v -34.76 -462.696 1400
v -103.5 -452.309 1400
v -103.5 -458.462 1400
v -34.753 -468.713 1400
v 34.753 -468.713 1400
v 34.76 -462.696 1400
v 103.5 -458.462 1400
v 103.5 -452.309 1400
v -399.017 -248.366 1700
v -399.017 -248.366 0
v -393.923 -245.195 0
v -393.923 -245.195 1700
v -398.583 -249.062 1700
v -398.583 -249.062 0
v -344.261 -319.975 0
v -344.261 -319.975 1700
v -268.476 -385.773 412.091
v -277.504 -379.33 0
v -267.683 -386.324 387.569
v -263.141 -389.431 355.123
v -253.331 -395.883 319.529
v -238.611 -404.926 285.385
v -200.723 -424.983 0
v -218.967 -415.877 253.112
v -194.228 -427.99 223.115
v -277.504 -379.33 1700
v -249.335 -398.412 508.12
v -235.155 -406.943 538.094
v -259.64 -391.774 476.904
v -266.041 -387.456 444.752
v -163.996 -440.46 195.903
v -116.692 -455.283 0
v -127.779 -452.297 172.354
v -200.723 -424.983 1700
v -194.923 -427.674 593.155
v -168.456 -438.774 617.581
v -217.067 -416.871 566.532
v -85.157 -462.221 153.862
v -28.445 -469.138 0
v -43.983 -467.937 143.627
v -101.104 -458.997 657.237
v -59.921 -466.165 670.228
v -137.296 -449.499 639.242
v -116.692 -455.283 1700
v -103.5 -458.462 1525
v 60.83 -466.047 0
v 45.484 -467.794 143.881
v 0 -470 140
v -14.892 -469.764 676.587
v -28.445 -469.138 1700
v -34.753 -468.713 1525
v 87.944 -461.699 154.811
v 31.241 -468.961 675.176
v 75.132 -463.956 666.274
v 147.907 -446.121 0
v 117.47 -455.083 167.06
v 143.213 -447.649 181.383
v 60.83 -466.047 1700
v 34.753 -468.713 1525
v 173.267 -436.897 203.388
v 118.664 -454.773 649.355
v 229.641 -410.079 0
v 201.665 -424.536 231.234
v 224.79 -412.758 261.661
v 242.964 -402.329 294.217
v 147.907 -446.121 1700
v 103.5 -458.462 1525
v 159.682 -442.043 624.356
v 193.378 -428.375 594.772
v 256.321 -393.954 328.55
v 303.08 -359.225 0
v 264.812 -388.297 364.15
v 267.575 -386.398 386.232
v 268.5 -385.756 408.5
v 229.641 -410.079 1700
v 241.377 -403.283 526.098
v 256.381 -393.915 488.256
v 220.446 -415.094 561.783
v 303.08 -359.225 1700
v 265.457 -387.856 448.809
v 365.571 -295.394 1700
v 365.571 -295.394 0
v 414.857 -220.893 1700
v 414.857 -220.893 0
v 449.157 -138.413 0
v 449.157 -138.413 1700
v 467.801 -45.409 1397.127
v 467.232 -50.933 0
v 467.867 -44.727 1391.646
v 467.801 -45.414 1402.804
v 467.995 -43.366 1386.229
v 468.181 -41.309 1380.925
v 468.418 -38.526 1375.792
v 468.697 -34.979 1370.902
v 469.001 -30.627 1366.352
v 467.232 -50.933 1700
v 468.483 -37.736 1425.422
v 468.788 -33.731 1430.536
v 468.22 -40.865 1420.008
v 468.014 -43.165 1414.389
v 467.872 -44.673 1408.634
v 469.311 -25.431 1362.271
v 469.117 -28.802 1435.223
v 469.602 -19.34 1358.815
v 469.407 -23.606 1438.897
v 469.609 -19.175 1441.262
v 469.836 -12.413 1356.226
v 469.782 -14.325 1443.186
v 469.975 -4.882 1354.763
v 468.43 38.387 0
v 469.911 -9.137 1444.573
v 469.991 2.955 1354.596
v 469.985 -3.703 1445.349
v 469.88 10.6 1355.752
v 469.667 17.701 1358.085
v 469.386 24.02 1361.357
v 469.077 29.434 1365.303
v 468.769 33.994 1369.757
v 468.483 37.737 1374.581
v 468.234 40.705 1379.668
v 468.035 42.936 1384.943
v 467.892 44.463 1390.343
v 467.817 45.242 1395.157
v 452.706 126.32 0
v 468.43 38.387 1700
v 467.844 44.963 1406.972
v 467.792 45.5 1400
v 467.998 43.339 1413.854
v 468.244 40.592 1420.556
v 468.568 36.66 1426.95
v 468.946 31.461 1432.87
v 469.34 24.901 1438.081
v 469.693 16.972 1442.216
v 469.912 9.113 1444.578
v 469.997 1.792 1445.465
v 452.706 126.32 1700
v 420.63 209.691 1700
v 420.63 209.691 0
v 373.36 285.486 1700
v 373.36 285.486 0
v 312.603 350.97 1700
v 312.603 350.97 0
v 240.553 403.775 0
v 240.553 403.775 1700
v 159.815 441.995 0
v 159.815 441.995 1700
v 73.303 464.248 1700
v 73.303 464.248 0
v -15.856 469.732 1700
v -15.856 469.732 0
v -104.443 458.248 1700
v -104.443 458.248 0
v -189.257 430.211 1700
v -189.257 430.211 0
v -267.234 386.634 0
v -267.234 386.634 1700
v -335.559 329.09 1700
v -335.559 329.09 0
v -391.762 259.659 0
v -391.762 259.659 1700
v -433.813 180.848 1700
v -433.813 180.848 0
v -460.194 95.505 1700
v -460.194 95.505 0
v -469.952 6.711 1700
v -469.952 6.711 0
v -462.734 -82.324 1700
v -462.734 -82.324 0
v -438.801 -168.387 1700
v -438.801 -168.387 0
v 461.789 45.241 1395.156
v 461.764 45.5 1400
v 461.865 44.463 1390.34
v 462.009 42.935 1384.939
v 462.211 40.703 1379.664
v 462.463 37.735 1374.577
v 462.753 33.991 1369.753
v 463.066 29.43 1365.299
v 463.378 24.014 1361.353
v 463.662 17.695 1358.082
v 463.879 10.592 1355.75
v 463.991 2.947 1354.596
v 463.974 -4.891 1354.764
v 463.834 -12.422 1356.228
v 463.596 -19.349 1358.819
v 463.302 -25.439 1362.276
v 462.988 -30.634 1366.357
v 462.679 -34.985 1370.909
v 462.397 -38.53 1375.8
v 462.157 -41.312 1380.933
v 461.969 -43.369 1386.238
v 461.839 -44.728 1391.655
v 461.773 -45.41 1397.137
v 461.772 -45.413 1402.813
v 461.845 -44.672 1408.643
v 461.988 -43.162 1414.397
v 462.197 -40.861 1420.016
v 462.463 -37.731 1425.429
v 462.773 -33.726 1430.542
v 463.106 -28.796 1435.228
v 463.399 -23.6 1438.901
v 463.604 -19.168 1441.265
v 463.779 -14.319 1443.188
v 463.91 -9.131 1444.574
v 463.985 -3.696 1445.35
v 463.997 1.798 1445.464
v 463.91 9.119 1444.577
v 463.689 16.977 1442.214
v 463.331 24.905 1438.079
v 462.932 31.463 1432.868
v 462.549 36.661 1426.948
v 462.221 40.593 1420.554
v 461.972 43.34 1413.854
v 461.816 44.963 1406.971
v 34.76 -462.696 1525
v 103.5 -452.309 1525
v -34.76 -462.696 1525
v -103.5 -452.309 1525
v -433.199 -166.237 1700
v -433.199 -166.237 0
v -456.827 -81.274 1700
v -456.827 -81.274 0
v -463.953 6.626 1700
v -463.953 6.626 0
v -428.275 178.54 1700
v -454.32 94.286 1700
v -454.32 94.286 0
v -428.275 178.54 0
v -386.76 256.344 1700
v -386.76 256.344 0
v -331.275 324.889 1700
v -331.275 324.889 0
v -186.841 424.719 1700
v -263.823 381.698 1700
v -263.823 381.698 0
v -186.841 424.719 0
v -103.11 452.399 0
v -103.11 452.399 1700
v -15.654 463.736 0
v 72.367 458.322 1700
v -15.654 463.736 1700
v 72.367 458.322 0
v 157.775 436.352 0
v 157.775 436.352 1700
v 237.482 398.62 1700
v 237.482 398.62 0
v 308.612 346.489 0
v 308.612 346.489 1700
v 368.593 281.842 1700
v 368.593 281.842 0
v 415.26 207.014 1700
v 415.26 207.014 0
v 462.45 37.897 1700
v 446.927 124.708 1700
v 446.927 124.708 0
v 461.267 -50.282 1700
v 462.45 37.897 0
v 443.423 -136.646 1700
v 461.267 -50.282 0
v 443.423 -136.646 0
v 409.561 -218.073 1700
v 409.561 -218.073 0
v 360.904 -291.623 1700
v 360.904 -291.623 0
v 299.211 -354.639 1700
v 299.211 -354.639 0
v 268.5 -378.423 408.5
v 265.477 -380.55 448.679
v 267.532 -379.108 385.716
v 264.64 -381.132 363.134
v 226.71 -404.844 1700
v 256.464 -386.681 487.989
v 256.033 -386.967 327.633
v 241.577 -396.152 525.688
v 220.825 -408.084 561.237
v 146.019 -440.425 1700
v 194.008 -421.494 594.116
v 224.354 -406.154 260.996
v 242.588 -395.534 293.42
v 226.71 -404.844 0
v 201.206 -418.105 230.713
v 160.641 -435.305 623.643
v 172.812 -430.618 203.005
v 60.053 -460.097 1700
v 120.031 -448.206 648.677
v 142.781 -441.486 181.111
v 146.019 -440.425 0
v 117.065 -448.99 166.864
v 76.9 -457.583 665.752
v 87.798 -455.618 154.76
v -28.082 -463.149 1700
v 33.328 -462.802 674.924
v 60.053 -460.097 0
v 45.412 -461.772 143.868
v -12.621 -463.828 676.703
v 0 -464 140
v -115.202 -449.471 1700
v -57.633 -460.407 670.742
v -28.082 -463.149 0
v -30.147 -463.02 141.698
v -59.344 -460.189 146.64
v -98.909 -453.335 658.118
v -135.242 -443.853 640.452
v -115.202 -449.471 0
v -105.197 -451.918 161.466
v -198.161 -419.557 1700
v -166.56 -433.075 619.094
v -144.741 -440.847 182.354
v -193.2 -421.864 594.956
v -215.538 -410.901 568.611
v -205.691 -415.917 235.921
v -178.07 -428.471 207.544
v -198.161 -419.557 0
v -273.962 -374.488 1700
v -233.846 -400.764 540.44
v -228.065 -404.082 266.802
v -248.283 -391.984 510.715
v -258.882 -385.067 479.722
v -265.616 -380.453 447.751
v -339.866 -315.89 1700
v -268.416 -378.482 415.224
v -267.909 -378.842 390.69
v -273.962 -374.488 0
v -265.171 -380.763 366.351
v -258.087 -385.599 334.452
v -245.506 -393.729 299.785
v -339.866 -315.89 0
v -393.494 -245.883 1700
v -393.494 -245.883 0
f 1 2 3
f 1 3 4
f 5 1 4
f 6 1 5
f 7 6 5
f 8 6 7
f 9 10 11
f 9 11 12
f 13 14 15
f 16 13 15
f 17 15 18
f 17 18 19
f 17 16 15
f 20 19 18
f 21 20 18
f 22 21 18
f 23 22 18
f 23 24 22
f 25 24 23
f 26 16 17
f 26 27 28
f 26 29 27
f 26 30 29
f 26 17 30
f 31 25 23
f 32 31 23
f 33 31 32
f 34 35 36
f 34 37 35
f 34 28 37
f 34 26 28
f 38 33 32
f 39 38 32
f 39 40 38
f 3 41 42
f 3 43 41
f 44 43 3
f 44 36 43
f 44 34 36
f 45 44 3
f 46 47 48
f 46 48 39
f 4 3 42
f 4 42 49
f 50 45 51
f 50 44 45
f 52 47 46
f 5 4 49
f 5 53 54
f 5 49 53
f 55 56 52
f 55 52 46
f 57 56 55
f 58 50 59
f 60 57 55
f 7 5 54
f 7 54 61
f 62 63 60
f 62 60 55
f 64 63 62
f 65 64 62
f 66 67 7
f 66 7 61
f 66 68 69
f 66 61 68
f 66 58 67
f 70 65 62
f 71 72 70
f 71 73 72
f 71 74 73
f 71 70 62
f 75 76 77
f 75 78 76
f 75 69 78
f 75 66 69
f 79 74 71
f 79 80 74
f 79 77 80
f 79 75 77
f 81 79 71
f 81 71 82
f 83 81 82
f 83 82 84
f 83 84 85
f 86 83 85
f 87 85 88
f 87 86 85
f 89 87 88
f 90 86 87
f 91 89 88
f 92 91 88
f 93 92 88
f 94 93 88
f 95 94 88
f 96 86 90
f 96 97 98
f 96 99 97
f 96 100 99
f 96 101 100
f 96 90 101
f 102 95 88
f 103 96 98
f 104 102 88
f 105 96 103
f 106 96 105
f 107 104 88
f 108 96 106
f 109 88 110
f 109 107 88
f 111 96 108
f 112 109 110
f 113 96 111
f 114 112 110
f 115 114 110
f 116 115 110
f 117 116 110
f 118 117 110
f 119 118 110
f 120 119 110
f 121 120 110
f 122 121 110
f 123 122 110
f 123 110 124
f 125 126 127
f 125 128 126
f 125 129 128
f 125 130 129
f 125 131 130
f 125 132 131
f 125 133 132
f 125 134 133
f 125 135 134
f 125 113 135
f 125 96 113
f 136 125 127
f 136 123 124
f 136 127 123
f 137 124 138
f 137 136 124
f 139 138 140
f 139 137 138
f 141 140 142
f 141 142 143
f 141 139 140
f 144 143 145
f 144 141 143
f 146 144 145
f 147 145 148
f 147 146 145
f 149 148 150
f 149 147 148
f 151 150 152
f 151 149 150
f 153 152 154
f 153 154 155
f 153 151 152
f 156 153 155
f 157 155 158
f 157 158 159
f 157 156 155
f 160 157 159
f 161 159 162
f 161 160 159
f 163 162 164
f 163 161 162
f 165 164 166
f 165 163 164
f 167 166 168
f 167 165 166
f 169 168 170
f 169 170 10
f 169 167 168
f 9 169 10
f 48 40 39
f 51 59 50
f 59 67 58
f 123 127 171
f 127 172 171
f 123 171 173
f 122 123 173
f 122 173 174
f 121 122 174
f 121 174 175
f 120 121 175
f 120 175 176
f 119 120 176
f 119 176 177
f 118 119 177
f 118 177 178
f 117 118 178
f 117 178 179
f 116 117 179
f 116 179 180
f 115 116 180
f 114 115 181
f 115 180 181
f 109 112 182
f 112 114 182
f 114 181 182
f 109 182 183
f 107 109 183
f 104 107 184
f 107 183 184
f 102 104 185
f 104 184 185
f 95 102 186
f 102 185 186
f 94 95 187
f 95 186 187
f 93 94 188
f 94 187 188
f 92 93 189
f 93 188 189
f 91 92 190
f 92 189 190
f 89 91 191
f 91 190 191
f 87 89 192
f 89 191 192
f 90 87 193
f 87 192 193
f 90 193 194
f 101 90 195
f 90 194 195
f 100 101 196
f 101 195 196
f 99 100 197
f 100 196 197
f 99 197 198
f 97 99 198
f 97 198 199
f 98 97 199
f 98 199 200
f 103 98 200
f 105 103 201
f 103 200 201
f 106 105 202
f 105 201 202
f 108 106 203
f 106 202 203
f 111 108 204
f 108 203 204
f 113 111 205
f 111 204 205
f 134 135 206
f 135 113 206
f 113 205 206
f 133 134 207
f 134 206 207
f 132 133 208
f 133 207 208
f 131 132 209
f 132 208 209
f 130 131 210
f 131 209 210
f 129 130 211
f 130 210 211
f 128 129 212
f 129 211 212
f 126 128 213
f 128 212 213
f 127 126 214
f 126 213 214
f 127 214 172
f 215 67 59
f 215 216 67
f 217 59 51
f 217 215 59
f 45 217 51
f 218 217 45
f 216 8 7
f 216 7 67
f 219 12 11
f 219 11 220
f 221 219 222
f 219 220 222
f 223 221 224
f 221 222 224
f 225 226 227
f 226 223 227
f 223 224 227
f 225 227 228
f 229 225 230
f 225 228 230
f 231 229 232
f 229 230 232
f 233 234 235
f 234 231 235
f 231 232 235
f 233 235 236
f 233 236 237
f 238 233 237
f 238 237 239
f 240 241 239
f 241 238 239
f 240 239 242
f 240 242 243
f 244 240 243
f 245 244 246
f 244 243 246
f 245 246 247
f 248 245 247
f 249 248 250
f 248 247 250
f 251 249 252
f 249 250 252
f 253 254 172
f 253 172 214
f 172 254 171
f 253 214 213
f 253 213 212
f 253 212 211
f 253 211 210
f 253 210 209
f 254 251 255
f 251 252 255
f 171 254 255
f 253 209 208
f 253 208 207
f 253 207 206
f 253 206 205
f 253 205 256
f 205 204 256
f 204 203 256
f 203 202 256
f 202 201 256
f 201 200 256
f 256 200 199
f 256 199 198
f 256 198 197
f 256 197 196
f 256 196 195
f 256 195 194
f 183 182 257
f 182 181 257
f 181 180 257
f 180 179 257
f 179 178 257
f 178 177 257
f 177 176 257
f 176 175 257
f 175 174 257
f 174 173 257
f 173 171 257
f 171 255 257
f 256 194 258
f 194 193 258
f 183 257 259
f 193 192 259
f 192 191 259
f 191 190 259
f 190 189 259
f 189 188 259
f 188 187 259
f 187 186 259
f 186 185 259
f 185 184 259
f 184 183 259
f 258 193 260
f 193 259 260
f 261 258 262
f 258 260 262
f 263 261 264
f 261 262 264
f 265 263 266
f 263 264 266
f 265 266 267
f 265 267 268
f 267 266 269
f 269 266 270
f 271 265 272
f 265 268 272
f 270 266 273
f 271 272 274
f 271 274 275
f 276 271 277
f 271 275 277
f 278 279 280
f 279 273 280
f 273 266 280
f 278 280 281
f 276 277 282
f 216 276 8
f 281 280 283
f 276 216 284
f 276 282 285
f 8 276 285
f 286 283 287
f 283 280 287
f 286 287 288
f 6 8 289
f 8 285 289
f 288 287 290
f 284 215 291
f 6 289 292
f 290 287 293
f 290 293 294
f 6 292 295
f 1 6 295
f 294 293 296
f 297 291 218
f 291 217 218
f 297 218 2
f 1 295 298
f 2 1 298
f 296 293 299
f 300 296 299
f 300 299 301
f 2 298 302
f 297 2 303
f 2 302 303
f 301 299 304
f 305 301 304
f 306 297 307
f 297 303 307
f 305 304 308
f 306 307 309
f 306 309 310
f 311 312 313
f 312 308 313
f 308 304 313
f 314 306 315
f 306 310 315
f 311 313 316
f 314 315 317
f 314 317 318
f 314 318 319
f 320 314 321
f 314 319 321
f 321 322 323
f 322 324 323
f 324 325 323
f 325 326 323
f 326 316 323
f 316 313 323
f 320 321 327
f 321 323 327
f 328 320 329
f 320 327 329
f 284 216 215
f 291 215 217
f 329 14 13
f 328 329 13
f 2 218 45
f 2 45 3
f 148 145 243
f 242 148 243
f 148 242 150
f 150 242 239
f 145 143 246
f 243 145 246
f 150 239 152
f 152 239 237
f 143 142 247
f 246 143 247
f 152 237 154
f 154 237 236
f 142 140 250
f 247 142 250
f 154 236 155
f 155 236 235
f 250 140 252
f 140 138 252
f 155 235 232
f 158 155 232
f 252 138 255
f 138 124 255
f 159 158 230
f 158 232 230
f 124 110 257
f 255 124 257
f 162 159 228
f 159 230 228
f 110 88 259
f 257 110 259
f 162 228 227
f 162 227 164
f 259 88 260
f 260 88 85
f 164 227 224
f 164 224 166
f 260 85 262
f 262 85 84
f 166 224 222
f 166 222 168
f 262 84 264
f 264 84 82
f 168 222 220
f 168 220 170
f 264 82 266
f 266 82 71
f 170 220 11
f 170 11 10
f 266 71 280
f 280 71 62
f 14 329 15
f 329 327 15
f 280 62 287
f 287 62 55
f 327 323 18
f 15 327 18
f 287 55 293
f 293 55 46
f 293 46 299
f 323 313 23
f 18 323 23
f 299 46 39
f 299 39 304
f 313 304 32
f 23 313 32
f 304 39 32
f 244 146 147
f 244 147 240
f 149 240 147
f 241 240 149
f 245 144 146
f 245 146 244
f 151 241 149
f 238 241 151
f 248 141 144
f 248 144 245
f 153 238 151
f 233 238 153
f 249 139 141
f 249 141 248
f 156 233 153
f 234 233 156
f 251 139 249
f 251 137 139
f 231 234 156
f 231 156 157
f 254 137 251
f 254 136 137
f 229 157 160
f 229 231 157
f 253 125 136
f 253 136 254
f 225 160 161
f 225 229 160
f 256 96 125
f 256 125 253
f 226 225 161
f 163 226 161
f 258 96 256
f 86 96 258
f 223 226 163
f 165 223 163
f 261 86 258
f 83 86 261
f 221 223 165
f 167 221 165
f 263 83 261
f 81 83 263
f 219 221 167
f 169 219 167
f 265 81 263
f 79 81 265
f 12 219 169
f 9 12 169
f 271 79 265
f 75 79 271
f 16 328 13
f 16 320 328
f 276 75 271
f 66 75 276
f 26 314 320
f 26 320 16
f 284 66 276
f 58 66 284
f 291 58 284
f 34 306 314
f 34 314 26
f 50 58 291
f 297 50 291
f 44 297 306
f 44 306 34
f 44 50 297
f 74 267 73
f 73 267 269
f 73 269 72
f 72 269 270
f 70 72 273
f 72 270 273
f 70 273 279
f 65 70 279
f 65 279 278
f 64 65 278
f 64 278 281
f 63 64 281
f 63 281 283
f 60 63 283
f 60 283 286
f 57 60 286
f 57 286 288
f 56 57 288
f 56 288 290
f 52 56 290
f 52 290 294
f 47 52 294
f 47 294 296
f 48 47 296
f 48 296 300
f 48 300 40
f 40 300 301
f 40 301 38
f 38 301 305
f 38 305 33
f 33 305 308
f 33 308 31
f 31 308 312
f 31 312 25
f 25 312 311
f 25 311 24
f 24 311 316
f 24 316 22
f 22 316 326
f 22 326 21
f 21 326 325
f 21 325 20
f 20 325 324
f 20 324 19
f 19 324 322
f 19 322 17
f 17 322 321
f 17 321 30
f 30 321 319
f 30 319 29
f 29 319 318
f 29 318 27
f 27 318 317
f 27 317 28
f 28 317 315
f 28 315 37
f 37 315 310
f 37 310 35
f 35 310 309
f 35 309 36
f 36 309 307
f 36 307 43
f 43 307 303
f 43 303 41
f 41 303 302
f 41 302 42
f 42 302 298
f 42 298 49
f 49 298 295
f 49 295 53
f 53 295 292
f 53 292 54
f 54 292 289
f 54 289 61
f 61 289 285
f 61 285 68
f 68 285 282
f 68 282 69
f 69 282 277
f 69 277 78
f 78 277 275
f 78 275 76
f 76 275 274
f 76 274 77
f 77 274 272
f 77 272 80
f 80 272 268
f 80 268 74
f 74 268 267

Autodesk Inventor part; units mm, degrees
sketch "Sketch13" plane through (0, 0, 0) normal (0, 0, 1) x (1, 0, 0)
  circle A0 centre (0, 0) radius 470 construction
  line L0 (0, 0) -> (0, -470)
  line L1 (0, 0) -> (-398.5826, -249.0621)
  line L2 (0, 0) -> (470, 0)
  line L3 (0, 0) -> (0, -470)
  line L4 (0, 0) -> (0, -470)
  line L5 (0, 0) -> (-418.7731, -213.3755)
  arc A1 (-398.5826, -249.0621) -> (0, -470) centre (0, 0) ccw
  dimension "d53" = 940
  dimension "d54" = 58
  dimension "d55" = 0
  dimension "d56" = 0
  dimension "d57" = 270
  dimension "d58" = 63
ref_plane "WeldJoint" through (0, 0, -10) normal (0.5299, -0.848, 0) x (0, 0, 1)
ref_plane "Outer" through (0, 0, -10) normal (0.454, -0.891, 0) x (0, 0, 1)
ref_plane "Clock_Feeder" through (0, 0, -10) normal (0, 1, 0) x (0, 0, 1)
ref_plane "Charging" through (0, 0, -10) normal (1, 0, 0) x (0, 0, 1)
ref_plane "Accsess" through (0, 0, -10) normal (1, 0, 0) x (0, 0, 1)
sketch "Sketch14" plane through (0, 0, -10) normal (0.5299, -0.848, 0) x (0, 0, 1)
  line L0 (1710, 464) -> (10, 464)
  line L1 (10, 464) -> (10, 470)
  line L2 (10, 470) -> (1710, 470)
  line L3 (1710, 470) -> (1710, 464)
  line L4 (10, 0) -> (825.0673, 0)
  point P0 (10, 467)
  dimension "d59" = 1700
  dimension "d60" = 6
  dimension "d61" = 940
revolve "Revolution2" add sketch "Sketch14" angle 359.9 about axis through (0, 0, 0) along (0, 0, 1)
sketch "Sketch AnglePlane_Feeder" plane through (0, 0, -10) normal (0, 1, 0) x (0, 0, 1)
  line L0 (10, -470) -> (10, 470) projected
  line L1 (10, 0) -> (1410, 0)
  line L2 (1410, 0) -> (1410, 470)
  line L3 (1410, 470) -> (10, 470)
  line L4 (10, 470) -> (10, 0)
  point P0 (10, -398.5826)
  point P1 (10, -399.0167)
  dimension "d63" = 940
  dimension "d64" = 90
  dimension "frd_hght" = 1400
ref_plane "AnglePlane_Feeder" through (0, 0, 1400) normal (1, 0, 0) x (0, 1, 0)
sketch "Sketch16" plane through (0, 0, 1400) normal (1, 0, 0) x (0, 1, 0)
  circle A0 centre (0, 0) radius 45.5
  point P0 (0, -1400)
  point P1 (0, 0)
  point P2 (0, 0)
  point P3 (0, 0)
  dimension "d66" = 91
extrude "Extrusion7" cut sketch "Sketch16" along normal through all
ref_plane "Work Plane16" through (0, 0, 0) normal (0, -1, 0) x (1, 0, 0)
sketch "Sketch17" plane through (0, 0, 0) normal (0, -1, 0) x (1, 0, 0)
  circle A0 centre (0, 408.5) radius 268.5
  line L0 (0, 140) -> (-495.5727, 140)
  point P0 (0, 0)
  dimension "d69" = 537
  dimension "d71" = 140
extrude "Extrusion8" cut sketch "Sketch17" along normal through all
sketch "Sketch19" plane through (0, 0, -10) normal (1, 0, 0) x (0, 0, 1)
  line L0 (10, 0) -> (1410, 0)
  line L1 (1410, 0) -> (1410, 470)
  line L2 (1410, 470) -> (10, 470)
  line L3 (10, 470) -> (10, 0)
  dimension "d74" = 1400
  dimension "d76" = 940
  dimension "d77" = 90
ref_plane "Work Plane18" through (0, 0, 1400) normal (0, -1, 0) x (1, 0, 0)
sketch "Sketch20" plane through (0, 0, 1400) normal (0, -1, 0) x (1, 0, 0)
  line L0 (-103.5, 0) -> (103.5, 0)
  line L1 (103.5, 0) -> (103.5, 125)
  line L2 (103.5, 125) -> (-103.5, 125)
  line L3 (-103.5, 125) -> (-103.5, 0)
  point P0 (0, -1400)
  point P1 (0, 0)
  point P2 (0, 0)
  point P3 (0, 0)
  point P4 (0, 0)
  dimension "d78" = 207
  dimension "d79" = 125
extrude "Extrusion9" cut sketch "Sketch20" along normal through all
equation "\"BendRadius\" = Thickness"
equation "\"BendReliefWidth\" = Thickness"
equation "\"BendReliefDepth\" = 0.5 * Thickness"
equation "\"CornerReliefSize\" = 4 * Thickness"
equation "\"MinimumRemnant\" = 2 * Thickness"
equation "\"TransitionRadius\" = BendRadius"
equation "\"JacobiRadiusSize\" = BendRadius"
equation "\"GapSize\" = Thickness"
equation "\"Feeder_horisont_angle\" = 0"
equation "\"Hatch_Accsess_diameter\" = 535"
equation "\"Clock_Accsess_angle\" = 0"
equation "\"Clock_Charging_agnle\" = 0"
equation "\"Clock_Feeder_angle\" = 270deg"
equation "\"Clock_Outer_angle\" = 63deg"
equation "\"Clock_WeldJoint_angle\" = 58deg"
equation "\"Thickness\" = 6"
properties part number "PRS 940-10 main Shell D 940" material "Steel"
